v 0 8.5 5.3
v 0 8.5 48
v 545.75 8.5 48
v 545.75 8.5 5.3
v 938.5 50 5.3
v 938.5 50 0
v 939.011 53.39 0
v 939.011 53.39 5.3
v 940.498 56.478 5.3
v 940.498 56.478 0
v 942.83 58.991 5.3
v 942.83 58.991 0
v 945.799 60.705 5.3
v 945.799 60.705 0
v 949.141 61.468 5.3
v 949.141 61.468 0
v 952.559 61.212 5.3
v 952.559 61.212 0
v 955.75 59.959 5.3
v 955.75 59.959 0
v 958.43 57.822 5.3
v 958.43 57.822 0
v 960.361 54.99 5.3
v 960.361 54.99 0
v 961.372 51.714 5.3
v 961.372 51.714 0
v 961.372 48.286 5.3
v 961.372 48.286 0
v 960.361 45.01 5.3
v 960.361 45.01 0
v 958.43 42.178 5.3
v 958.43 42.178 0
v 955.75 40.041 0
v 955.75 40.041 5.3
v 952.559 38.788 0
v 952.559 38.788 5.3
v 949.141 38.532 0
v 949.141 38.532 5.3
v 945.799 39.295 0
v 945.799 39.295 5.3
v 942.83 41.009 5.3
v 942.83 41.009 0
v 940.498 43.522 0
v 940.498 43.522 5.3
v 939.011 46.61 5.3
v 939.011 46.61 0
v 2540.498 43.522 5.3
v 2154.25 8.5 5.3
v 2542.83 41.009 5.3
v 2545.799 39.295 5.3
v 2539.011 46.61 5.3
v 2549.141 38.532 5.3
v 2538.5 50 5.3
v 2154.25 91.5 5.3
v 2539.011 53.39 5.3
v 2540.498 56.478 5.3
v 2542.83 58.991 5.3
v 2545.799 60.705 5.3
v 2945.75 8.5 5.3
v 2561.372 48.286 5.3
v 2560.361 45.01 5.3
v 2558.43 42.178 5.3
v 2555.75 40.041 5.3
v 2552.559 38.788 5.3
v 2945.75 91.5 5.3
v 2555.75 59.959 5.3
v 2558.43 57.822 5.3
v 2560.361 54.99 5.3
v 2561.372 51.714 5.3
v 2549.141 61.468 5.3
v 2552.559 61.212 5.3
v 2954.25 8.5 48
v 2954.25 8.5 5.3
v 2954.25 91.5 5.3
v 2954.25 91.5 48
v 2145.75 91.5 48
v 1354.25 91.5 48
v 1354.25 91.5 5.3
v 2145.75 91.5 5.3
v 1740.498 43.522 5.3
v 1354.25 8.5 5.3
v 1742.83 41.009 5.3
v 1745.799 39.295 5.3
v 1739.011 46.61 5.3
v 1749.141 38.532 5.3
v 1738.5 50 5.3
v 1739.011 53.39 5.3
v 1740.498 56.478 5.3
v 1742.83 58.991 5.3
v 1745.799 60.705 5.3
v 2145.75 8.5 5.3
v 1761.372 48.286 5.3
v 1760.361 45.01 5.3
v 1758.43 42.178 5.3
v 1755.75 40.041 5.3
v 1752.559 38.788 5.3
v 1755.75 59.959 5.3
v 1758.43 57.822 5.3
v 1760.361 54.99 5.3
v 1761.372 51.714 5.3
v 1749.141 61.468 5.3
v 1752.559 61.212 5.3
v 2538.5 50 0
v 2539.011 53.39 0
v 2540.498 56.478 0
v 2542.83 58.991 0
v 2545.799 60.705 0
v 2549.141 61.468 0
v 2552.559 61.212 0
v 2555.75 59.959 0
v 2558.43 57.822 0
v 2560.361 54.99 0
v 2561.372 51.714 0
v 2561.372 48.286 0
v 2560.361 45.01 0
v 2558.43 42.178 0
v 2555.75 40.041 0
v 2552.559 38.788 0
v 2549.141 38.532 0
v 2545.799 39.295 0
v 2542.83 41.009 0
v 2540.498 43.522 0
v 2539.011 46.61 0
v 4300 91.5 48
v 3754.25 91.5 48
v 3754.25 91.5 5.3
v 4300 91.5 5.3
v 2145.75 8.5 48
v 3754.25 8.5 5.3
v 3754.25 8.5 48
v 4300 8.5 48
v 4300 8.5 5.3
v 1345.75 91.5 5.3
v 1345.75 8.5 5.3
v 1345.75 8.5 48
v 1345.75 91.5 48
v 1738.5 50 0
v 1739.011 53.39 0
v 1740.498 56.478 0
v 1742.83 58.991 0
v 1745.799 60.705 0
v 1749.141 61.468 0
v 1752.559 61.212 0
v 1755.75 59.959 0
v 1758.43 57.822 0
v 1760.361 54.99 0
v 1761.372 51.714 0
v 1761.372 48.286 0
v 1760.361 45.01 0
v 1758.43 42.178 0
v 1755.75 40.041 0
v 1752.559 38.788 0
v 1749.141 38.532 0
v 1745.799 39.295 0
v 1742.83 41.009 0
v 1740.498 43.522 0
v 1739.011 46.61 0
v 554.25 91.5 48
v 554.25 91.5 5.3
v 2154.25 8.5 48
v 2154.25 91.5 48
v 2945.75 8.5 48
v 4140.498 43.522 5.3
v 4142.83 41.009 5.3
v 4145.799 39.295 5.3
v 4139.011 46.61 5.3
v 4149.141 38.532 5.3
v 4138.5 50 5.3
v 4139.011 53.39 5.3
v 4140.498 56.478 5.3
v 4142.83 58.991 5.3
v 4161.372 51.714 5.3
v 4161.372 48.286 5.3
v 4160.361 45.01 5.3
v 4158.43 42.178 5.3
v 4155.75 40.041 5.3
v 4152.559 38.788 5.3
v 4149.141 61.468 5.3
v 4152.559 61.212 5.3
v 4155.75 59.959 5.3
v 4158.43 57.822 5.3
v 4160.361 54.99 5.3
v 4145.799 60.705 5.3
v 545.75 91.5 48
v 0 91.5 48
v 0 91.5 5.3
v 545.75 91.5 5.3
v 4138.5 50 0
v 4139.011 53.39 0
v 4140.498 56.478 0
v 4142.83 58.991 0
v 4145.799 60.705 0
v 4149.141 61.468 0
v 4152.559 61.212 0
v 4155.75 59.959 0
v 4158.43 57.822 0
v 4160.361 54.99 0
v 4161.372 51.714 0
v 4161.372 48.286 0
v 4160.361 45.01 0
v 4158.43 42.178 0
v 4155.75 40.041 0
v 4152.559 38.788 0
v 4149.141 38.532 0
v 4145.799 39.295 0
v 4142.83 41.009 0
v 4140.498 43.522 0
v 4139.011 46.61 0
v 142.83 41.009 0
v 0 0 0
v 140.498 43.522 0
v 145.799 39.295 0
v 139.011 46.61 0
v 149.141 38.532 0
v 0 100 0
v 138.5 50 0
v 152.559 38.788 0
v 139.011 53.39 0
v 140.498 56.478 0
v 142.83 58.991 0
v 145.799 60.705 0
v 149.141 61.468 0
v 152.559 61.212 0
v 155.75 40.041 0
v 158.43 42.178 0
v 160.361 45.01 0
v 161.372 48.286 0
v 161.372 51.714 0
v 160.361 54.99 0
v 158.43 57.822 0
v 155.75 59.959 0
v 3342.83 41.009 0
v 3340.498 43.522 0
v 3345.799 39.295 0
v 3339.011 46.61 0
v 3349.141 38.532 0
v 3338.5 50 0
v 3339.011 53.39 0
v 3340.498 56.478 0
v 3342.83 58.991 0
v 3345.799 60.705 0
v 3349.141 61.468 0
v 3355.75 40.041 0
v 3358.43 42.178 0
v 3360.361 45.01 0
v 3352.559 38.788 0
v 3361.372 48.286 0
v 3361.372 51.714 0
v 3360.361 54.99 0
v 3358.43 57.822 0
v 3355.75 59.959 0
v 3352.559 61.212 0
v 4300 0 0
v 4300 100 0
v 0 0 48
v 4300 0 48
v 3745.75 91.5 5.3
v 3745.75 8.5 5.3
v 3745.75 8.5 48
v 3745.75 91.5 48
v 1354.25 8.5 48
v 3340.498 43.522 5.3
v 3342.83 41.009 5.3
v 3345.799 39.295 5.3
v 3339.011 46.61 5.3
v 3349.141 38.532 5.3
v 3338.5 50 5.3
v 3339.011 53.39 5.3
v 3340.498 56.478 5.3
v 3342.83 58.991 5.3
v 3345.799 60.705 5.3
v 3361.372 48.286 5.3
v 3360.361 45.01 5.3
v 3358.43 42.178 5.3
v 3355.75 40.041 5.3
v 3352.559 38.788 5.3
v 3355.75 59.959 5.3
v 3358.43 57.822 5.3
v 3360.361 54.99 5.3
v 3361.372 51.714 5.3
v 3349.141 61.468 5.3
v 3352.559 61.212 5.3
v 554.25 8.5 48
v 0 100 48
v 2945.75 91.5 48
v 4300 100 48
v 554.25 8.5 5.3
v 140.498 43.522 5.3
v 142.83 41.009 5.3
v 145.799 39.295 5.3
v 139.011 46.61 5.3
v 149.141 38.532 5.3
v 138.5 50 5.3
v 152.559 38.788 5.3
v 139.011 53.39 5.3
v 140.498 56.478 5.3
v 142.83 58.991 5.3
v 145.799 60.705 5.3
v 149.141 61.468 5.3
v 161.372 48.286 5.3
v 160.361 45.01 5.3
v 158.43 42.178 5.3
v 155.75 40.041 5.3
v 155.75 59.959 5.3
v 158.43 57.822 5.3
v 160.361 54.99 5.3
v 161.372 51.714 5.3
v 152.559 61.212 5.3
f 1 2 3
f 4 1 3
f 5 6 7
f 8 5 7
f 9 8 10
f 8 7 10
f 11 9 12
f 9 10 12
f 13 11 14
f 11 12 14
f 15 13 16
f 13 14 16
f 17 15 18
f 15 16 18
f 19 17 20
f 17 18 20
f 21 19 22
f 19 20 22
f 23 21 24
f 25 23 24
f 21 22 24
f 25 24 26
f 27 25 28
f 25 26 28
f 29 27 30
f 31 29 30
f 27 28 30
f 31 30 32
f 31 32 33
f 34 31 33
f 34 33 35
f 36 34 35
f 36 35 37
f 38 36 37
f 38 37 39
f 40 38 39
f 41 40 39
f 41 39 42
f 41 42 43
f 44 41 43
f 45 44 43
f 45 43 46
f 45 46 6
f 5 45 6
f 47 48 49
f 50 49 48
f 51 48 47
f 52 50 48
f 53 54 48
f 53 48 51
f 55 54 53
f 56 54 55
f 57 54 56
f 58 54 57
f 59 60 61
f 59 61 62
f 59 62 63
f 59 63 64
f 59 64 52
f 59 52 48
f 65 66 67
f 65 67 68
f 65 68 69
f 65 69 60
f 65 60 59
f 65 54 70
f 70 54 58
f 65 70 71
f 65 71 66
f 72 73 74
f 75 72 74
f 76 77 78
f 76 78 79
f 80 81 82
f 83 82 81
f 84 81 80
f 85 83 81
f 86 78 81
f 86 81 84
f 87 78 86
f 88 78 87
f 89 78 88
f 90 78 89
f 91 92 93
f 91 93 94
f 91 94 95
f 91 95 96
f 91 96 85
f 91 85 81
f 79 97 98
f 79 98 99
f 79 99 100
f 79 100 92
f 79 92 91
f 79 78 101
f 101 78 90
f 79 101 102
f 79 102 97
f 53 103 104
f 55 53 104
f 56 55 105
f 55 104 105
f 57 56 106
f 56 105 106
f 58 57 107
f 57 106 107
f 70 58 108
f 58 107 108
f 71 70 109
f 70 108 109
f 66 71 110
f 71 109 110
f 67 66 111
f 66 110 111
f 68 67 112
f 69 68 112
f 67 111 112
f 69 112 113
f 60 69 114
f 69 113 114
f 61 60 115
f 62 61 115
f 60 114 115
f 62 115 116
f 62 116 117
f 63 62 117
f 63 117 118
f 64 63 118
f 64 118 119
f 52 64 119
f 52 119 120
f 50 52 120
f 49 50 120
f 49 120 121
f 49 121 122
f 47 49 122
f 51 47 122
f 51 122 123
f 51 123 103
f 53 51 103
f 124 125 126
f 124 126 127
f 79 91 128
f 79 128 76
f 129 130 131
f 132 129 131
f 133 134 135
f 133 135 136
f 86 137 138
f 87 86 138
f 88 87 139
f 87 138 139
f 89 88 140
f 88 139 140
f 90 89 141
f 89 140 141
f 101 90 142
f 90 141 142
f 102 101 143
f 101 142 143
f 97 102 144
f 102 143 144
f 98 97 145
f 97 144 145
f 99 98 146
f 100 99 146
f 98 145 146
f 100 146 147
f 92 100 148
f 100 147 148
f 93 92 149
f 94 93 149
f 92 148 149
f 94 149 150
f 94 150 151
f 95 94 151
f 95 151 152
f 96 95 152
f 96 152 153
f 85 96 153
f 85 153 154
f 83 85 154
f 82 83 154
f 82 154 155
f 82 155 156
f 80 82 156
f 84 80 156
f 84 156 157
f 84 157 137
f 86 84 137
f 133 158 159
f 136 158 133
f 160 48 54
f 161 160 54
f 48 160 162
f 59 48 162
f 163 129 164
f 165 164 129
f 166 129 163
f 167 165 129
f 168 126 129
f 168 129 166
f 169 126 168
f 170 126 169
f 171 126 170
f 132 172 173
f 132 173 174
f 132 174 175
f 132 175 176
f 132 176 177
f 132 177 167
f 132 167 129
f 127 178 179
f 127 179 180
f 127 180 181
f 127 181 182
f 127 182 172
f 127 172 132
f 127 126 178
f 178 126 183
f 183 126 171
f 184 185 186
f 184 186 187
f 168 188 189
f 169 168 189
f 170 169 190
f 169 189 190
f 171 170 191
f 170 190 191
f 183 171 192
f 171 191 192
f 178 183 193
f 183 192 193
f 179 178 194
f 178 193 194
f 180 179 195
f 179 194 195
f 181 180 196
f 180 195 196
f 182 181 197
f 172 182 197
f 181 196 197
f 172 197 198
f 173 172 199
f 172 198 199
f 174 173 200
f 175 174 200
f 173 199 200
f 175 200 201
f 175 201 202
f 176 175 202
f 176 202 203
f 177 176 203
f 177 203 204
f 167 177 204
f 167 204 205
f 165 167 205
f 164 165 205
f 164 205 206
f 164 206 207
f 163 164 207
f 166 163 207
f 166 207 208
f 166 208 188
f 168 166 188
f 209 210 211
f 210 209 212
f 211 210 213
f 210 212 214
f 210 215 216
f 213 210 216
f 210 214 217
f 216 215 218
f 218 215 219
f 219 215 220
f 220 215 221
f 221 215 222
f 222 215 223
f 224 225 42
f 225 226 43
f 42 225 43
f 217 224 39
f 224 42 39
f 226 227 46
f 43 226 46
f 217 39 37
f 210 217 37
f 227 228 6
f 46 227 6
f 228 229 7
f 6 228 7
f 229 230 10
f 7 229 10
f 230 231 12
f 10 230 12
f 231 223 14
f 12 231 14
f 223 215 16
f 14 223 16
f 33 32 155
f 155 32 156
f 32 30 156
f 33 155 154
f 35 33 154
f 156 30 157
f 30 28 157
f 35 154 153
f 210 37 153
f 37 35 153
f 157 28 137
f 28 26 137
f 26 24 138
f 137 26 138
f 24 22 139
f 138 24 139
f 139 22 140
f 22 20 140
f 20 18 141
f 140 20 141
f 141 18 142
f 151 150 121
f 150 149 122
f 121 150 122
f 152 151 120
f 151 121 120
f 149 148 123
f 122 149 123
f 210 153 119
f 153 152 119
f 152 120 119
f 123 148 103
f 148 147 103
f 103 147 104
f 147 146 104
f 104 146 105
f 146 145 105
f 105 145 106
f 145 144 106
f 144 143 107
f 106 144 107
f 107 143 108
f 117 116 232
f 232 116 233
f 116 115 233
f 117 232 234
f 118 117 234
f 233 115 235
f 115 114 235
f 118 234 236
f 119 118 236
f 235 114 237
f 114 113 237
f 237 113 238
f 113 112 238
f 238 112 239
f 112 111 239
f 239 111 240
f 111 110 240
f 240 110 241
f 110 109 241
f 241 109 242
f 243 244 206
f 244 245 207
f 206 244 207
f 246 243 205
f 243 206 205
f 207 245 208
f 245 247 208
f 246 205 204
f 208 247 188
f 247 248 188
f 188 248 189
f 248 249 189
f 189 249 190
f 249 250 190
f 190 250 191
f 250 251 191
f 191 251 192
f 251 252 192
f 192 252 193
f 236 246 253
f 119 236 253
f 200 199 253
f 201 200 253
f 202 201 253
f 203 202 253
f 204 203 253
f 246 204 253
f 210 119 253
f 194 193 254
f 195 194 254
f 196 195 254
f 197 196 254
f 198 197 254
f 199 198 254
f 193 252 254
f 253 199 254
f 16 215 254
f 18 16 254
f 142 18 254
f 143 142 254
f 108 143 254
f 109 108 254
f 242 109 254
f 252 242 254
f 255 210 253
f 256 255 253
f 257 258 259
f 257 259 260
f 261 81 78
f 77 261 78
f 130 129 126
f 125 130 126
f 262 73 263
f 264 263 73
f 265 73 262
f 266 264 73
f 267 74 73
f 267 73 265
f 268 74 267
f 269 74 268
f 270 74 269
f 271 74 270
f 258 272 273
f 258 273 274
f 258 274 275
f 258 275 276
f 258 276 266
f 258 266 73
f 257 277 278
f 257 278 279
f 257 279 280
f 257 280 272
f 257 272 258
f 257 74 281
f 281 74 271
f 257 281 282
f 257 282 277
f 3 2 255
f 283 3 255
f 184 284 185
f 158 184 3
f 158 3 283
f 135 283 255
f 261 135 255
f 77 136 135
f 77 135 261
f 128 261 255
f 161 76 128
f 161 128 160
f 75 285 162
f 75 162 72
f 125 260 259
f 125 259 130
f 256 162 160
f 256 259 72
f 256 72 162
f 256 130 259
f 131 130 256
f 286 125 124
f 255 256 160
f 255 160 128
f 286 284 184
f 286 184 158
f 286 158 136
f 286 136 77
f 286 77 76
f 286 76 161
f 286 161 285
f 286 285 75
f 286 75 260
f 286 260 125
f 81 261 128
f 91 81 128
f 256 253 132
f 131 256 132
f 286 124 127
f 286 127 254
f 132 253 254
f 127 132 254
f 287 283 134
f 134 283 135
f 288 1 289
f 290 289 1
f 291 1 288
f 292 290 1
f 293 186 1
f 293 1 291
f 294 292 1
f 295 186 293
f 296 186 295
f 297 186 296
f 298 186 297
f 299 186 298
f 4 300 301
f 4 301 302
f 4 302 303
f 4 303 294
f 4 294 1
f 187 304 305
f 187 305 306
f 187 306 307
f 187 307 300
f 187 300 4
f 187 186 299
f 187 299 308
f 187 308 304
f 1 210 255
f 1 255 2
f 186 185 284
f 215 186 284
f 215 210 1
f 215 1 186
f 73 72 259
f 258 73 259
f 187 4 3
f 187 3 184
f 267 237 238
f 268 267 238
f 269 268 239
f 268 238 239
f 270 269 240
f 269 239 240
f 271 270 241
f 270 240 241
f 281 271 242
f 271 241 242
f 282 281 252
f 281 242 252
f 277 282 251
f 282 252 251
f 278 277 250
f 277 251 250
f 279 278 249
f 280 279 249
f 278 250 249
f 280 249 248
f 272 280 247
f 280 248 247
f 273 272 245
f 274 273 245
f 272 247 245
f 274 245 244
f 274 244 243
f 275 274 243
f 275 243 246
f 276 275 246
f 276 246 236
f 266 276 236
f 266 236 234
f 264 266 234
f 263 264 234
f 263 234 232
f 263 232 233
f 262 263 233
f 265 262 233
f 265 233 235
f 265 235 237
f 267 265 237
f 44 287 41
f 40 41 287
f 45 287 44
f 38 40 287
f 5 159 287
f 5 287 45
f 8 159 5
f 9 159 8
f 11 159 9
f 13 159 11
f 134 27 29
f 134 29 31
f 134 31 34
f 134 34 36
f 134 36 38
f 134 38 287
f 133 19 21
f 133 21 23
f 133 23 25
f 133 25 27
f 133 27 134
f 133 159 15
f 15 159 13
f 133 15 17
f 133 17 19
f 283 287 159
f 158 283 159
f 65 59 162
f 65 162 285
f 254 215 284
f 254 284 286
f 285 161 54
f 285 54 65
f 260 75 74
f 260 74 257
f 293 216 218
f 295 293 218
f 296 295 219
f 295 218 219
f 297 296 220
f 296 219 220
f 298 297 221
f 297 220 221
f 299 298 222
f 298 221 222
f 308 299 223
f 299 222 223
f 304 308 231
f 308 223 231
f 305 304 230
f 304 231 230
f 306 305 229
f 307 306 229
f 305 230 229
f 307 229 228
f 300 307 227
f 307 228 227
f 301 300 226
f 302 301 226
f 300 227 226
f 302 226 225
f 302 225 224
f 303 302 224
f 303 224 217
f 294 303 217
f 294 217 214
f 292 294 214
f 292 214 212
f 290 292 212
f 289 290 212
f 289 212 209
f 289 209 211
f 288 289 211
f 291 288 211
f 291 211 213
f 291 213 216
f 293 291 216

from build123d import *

# Parameters (mm, degrees)
SKETCH_1_W             = 4300
SKETCH_1_H             = 100
EXTRUDE_1_DEPTH        = 48
SKETCH_2_W             = 4300
SKETCH_2_H             = 83
CUT_EXTRUDE_2_DEPTH    = 42.7
SKETCH_3_W             = 8.5
SKETCH_3_H             = 83
EXTRUDE_3_DEPTH        = 42.7
PATTERN_LINEAR_1_COUNT = 5
PATTERN_LINEAR_1_PITCH = 800
SKETCH_4_R             = 11.5
CUT_EXTRUDE_4_DEPTH    = 4302.430459742
PATTERN_LINEAR_2_COUNT = 6
PATTERN_LINEAR_2_PITCH = 800


with BuildPart() as part:
    # 草图1 → 拉伸1 (new body)
    with BuildSketch(Plane.XY):
        with Locations((2150, 50)):
            Rectangle(SKETCH_1_W, SKETCH_1_H)
    extrude(amount=EXTRUDE_1_DEPTH)

    # 草图2 → 拉伸2 (cut)
    with BuildSketch(Plane.XY.offset(48)):
        with Locations((2150, 50)):
            Rectangle(SKETCH_2_W, SKETCH_2_H)
    extrude(amount=-CUT_EXTRUDE_2_DEPTH, mode=Mode.SUBTRACT)

    # 草图3 → 拉伸3 (add)
    with BuildSketch(Plane.XY.offset(5.3)):
        with Locations((550, 50)):
            Rectangle(SKETCH_3_W, SKETCH_3_H)
    extrude_3 = extrude(amount=EXTRUDE_3_DEPTH)

    # 阵列(线性)1: 拉伸3 ×5
    with Locations(*[(i * PATTERN_LINEAR_1_PITCH, 0, 0) for i in range(1, PATTERN_LINEAR_1_COUNT)]):
        add(extrude_3)

    # 草图4 → 拉伸4 (cut, through all)
    with BuildSketch(Plane(origin=(0, 0, 0), x_dir=(-1, 0, 0), z_dir=(0, 0, -1))):
        with Locations((-4150, 50)):
            Circle(SKETCH_4_R)
    cut_extrude_4 = extrude(amount=-CUT_EXTRUDE_4_DEPTH, mode=Mode.SUBTRACT)

    # 阵列(线性)2: 拉伸4 ×6
    with Locations(*[(-i * PATTERN_LINEAR_2_PITCH, 0, 0) for i in range(1, PATTERN_LINEAR_2_COUNT)]):
        add(cut_extrude_4, mode=Mode.SUBTRACT)


solid = part.part
